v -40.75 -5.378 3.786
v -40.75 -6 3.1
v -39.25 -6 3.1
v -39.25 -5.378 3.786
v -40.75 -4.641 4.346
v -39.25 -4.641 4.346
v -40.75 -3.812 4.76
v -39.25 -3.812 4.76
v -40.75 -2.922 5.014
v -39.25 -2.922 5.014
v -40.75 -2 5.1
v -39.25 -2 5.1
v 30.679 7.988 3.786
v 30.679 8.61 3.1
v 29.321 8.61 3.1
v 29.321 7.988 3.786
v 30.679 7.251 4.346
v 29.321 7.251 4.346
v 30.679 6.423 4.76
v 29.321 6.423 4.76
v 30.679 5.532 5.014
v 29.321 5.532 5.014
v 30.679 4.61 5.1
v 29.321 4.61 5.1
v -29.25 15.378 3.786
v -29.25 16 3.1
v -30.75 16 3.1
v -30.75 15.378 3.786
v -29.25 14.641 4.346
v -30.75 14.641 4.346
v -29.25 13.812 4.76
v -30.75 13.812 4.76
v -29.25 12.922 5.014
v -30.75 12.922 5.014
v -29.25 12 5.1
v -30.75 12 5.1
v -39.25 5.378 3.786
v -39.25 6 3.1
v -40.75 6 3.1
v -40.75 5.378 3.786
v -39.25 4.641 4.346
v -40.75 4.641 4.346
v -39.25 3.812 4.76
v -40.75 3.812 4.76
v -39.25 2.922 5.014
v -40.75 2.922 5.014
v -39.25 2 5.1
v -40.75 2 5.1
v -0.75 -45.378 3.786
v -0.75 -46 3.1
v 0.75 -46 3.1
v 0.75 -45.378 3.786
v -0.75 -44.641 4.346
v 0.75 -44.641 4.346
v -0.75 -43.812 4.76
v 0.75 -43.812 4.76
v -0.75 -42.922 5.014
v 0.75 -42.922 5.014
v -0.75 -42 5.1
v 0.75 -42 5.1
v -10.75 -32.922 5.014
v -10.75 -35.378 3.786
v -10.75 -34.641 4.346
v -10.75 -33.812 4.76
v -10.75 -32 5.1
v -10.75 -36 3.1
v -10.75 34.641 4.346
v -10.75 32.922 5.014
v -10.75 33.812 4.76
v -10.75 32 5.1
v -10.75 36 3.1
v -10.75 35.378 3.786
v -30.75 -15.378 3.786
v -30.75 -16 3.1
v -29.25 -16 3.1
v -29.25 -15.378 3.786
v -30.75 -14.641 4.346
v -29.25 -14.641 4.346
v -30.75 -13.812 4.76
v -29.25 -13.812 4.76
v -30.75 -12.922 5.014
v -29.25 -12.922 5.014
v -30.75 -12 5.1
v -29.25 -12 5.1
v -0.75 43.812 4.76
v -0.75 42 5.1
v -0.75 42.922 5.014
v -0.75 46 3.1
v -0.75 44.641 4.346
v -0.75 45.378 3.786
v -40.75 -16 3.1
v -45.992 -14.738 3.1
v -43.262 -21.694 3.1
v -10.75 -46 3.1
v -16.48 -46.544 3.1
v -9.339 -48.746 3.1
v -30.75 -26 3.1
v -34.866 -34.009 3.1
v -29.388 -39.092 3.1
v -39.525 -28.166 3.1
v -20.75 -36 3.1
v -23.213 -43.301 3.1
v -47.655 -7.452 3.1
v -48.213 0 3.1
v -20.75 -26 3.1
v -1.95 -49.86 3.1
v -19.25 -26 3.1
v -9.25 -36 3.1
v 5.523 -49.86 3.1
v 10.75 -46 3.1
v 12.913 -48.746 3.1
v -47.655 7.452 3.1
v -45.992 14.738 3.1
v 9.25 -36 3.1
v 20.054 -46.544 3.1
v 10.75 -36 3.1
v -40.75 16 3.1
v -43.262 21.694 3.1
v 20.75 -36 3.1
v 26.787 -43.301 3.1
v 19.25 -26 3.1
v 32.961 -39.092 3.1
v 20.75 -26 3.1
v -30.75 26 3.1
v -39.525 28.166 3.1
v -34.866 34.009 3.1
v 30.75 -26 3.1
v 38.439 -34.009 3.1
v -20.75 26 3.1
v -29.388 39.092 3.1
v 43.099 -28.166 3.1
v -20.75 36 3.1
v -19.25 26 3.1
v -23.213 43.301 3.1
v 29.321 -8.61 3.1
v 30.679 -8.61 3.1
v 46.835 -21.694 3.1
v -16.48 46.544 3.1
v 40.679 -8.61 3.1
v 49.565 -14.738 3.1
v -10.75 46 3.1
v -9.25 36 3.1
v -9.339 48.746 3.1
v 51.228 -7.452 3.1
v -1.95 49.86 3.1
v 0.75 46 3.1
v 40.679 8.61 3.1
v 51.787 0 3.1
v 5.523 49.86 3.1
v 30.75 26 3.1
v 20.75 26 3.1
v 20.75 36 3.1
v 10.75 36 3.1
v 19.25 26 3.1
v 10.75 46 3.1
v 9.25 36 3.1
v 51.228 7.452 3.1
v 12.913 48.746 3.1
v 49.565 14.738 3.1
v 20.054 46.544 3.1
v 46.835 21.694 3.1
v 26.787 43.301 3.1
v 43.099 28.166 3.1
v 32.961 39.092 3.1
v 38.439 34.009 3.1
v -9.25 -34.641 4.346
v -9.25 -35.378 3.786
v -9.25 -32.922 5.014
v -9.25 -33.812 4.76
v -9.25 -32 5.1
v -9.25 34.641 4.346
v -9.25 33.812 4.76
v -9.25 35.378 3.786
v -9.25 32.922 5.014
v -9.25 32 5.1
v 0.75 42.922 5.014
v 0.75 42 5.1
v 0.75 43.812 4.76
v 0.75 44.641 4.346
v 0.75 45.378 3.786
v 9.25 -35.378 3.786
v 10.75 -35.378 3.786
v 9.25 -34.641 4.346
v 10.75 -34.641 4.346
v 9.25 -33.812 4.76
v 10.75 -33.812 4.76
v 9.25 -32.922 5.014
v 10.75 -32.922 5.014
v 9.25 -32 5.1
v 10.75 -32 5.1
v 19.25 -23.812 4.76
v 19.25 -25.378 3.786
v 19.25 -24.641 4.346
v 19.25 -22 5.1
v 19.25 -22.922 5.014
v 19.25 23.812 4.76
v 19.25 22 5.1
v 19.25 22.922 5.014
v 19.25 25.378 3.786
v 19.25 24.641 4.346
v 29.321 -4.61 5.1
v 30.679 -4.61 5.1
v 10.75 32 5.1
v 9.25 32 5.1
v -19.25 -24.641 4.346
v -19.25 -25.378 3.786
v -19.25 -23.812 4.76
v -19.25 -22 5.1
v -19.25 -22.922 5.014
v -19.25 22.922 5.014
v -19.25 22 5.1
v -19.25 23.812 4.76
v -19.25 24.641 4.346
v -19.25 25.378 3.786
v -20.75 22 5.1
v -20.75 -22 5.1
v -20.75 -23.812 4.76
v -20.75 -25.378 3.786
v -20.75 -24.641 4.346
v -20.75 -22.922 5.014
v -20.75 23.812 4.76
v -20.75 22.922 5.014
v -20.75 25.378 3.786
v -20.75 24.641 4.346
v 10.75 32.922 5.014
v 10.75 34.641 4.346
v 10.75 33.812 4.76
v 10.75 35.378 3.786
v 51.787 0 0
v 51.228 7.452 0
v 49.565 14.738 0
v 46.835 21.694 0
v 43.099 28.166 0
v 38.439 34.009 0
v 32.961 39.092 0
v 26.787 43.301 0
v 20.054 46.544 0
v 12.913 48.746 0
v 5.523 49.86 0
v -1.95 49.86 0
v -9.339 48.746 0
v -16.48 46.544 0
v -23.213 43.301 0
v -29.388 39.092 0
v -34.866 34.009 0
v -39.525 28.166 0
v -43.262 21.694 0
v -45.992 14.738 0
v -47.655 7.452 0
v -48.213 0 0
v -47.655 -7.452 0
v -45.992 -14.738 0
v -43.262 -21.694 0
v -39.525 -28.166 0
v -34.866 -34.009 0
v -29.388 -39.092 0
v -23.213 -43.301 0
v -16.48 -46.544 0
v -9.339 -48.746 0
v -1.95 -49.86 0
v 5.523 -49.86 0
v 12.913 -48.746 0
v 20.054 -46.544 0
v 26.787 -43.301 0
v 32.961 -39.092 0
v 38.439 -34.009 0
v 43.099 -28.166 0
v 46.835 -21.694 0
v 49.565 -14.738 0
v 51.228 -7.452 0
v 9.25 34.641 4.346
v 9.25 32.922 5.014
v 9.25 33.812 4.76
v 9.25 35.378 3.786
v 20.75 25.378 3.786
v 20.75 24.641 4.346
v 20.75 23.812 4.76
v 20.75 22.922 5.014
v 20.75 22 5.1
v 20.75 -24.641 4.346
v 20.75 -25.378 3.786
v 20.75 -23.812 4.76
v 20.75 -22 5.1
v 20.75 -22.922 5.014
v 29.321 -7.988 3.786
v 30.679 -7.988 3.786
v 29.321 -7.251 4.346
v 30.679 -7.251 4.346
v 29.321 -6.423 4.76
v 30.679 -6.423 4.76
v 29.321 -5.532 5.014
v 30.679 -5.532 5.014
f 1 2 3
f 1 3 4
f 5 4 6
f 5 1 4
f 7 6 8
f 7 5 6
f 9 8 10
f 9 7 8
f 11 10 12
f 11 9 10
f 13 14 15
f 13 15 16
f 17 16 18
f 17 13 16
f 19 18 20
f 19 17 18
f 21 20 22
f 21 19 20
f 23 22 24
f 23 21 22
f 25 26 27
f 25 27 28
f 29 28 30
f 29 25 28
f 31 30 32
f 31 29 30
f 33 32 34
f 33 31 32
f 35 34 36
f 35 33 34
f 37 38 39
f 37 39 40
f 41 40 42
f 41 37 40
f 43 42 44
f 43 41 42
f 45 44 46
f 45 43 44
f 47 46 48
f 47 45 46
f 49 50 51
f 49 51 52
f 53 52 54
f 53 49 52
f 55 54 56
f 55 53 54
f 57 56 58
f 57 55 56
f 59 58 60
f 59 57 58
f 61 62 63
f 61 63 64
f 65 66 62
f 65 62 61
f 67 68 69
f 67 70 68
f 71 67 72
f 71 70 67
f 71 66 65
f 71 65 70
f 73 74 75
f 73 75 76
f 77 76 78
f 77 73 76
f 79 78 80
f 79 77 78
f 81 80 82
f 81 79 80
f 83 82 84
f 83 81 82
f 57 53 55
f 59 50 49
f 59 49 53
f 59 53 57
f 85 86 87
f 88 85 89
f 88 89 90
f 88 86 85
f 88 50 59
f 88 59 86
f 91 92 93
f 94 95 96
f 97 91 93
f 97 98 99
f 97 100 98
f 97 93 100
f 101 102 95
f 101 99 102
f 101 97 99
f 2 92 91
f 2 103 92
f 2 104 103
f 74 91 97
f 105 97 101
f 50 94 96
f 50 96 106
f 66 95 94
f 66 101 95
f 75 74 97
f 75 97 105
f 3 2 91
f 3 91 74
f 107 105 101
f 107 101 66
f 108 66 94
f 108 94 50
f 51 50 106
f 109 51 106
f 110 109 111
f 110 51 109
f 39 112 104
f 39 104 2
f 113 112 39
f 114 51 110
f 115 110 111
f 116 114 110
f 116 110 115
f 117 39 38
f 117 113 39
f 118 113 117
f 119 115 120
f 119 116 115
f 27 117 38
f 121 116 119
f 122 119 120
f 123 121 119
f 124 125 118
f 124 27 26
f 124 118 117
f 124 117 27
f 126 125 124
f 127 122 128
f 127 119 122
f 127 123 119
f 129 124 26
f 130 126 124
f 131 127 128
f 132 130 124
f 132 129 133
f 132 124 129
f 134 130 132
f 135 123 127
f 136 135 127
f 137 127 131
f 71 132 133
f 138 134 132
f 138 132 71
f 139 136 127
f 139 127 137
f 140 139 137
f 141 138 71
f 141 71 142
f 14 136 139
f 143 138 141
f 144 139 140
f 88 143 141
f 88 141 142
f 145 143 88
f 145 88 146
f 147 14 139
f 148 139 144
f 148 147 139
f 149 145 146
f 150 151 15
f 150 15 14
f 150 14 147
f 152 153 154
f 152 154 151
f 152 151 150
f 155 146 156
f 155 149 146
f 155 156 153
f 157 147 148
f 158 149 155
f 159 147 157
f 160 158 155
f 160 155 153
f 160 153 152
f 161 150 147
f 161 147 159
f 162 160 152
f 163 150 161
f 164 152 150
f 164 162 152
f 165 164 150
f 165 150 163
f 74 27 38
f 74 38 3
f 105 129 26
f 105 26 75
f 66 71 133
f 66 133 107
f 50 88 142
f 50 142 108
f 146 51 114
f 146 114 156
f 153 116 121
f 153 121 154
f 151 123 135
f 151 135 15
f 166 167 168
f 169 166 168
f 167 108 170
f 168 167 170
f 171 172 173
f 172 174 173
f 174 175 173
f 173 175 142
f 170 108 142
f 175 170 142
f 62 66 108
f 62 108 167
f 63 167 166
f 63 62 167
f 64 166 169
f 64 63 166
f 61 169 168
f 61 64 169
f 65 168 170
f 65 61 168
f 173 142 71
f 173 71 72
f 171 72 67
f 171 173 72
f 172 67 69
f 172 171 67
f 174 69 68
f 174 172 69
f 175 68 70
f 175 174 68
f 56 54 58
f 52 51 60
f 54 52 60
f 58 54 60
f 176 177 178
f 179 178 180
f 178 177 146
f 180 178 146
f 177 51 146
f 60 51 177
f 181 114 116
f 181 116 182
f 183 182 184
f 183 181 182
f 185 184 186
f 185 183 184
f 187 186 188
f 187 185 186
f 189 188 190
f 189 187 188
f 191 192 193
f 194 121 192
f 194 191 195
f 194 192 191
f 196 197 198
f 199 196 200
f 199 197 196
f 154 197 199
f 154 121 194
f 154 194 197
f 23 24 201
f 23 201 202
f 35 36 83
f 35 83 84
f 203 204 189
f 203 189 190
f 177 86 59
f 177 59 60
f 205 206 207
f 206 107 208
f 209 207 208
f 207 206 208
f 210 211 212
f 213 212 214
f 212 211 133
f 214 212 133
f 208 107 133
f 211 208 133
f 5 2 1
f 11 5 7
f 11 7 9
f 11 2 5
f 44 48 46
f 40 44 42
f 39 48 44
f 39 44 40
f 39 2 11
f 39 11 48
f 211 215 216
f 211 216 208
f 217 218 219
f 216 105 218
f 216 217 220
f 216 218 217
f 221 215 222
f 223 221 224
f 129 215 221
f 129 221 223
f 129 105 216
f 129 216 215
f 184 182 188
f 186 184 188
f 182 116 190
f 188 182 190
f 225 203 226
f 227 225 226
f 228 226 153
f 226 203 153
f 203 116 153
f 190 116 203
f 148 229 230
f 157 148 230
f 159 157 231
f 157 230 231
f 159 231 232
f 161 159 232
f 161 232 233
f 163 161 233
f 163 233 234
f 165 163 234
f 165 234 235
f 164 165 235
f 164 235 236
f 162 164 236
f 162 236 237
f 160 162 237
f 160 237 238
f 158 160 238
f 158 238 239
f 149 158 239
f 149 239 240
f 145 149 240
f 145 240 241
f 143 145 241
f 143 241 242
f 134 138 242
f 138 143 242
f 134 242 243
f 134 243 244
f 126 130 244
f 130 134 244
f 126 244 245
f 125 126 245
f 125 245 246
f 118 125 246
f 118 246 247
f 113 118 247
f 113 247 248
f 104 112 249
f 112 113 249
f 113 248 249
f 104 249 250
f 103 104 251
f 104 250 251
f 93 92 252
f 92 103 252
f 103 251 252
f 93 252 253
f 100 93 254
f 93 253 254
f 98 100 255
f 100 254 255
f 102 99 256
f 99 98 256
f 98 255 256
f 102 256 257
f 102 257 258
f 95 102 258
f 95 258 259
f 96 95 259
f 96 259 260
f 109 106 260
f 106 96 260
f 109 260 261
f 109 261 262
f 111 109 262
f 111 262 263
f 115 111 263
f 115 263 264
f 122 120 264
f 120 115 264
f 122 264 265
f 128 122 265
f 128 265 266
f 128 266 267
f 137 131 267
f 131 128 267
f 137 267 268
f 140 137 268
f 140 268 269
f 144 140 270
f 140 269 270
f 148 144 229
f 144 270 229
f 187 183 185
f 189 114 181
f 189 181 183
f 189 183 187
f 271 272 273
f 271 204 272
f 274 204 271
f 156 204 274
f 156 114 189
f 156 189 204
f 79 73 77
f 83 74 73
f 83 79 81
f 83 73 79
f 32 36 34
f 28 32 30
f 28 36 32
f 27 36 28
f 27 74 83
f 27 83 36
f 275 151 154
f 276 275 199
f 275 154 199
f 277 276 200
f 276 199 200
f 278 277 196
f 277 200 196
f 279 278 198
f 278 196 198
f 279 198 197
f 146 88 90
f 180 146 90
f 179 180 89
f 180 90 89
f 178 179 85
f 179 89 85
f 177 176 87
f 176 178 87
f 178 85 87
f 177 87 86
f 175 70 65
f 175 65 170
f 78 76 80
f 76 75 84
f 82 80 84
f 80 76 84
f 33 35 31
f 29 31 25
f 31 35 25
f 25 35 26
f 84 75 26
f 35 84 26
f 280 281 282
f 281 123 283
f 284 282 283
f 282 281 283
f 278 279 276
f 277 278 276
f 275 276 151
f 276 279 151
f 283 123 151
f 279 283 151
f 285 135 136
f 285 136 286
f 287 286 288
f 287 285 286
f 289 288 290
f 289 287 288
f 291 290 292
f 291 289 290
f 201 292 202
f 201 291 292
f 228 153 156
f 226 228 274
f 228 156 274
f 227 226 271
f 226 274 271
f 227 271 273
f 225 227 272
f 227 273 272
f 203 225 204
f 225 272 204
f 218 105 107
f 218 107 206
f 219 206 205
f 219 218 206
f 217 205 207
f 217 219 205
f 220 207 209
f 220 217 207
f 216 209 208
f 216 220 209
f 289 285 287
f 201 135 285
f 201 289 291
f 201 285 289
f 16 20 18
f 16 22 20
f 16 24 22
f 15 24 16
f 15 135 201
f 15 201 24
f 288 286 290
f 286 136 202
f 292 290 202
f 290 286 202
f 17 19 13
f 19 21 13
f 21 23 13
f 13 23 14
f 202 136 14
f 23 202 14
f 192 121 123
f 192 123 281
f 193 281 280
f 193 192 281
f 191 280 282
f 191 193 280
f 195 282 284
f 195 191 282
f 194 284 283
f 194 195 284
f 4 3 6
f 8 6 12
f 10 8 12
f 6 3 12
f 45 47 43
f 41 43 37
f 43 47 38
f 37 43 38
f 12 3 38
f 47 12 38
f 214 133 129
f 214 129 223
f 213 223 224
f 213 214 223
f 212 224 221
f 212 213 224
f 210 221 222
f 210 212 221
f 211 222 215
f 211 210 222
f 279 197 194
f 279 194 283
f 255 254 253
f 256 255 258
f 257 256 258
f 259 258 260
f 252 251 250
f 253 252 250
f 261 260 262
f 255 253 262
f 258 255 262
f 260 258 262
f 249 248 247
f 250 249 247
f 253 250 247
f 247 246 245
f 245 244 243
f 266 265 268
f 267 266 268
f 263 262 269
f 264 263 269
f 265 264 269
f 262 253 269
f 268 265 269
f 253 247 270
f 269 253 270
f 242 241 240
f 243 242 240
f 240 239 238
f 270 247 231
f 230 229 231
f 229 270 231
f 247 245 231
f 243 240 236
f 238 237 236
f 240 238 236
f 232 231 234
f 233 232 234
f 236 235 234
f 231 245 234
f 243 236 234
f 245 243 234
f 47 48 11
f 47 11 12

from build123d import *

# Parameters (mm, degrees)
F0_R         = 50
F1_DEPTH     = 3.1
F2_W         = 1.5
F2_H         = 92
F2_H_2       = 72
F2_H_3       = 52
F2_H_4       = 32
F2_H_5       = 12
F2_W_2       = 1.3582831621
F2_H_6       = 17.2204319388
F3_DEPTH     = 2
F4_T1_DEPTH  = 11.5
F4_T3_DEPTH  = 11.5
F4_T5_DEPTH  = 21.5
F4_T10_DEPTH = 21.5
F4_T15_DEPTH = 21.5
F4_T20_DEPTH = 21.5
F4_T25_DEPTH = 21.5
F4_T30_DEPTH = 21.5
F4_T35_DEPTH = 21.5
F4_T40_DEPTH = 21.5
F4_T45_DEPTH = 21.5
F4_T50_DEPTH = 21.3582831621
F4_T55_DEPTH = 21.3582831621


# Not quite as in the source:
# - a fillet or chamfer that OpenCascade refuses, or shapes differently, is made with other operations: its cross-section is extruded or revolved along the edge and cut away or added


with BuildPart() as f1:
    # F0 (on Top) → F1 (new body)
    with BuildSketch(Plane.XY):
        with Locations((1.7865982372, 0)):
            Circle(F0_R)
    extrude(amount=F1_DEPTH)

    # F2 (on face) → F3 (join)
    with BuildSketch(Plane.XY.offset(3.1)):
        Rectangle(F2_W, F2_H)
        with Locations((-10, 0)):
            Rectangle(F2_W, F2_H_2)
        with Locations((-20, 0)):
            Rectangle(F2_W, F2_H_3)
        with Locations((-30, 0)):
            Rectangle(F2_W, F2_H_4)
        with Locations((-40, 0)):
            Rectangle(F2_W, F2_H_5)
        with Locations((10, 0)):
            Rectangle(F2_W, F2_H_2)
        with Locations((20, 0)):
            Rectangle(F2_W, F2_H_3)
        with Locations((30, 0)):
            Rectangle(F2_W_2, F2_H_6)
    extrude(amount=F3_DEPTH)

    # F4: fillet of radius 5 on 16 edges, made by hand

    # F4_s2 → F4_t1 (cut)
    with BuildSketch(Plane.YZ.offset(9.25)):
        with BuildLine():
            ThreePointArc((-36, 3.1), (-34.2360679775, 4.572135955), (-32, 5.1))
            Line((-32, 5.1), (-36, 5.1))
            Line((-36, 5.1), (-36, 3.1))
        make_face()
        with BuildLine():
            ThreePointArc((36, 3.1), (34.2360679775, 4.572135955), (32, 5.1))
            Line((32, 5.1), (36, 5.1))
            Line((36, 5.1), (36, 3.1))
        make_face()
    extrude(amount=F4_T1_DEPTH, mode=Mode.SUBTRACT)

    # F4_s4 → F4_t3 (cut)
    with BuildSketch(Plane.YZ.offset(19.25)):
        with BuildLine():
            ThreePointArc((26, 3.1), (24.2360679775, 4.572135955), (22, 5.1))
            Line((22, 5.1), (26, 5.1))
            Line((26, 5.1), (26, 3.1))
        make_face()
        with BuildLine():
            ThreePointArc((-26, 3.1), (-24.2360679775, 4.572135955), (-22, 5.1))
            Line((-22, 5.1), (-26, 5.1))
            Line((-26, 5.1), (-26, 3.1))
        make_face()
    extrude(amount=F4_T3_DEPTH, mode=Mode.SUBTRACT)

    # F4_s6 → F4_t5 (cut)
    with BuildSketch(Plane.YZ.offset(-10.75)):
        with BuildLine():
            ThreePointArc((46, 3.1), (44.2360679775, 4.572135955), (42, 5.1))
            Line((42, 5.1), (46, 5.1))
            Line((46, 5.1), (46, 3.1))
        make_face()
        with BuildLine():
            ThreePointArc((-46, 3.1), (-44.2360679775, 4.572135955), (-42, 5.1))
            Line((-42, 5.1), (-46, 5.1))
            Line((-46, 5.1), (-46, 3.1))
        make_face()
    extrude(amount=F4_T5_DEPTH, mode=Mode.SUBTRACT)


with BuildPart() as f4_tool8:
    # F4_s9 → F4_t10 (new body)
    with BuildSketch(Plane.YZ.offset(0.75)):
        with BuildLine():
            ThreePointArc((36, 3.1), (34.2360679775, 4.572135955), (32, 5.1))
            Line((32, 5.1), (36, 5.1))
            Line((36, 5.1), (36, 3.1))
        make_face()
    extrude(amount=-F4_T10_DEPTH)

    split(bisect_by=Plane.YZ.offset(-0.75), keep=Keep.BOTTOM)


with BuildPart() as f1_1:
    add(f1.part)

    # F4_t7: cut F4_tool8
    add(f4_tool8.part, mode=Mode.SUBTRACT)


with BuildPart() as f4_tool13:
    # F4_s14 → F4_t15 (new body)
    with BuildSketch(Plane.YZ.offset(-9.25)):
        with BuildLine():
            ThreePointArc((26, 3.1), (24.2360679775, 4.572135955), (22, 5.1))
            Line((22, 5.1), (26, 5.1))
            Line((26, 5.1), (26, 3.1))
        make_face()
    extrude(amount=-F4_T15_DEPTH)

    split(bisect_by=Plane.YZ.offset(-10.75), keep=Keep.BOTTOM)


with BuildPart() as f1_2:
    add(f1_1.part)

    # F4_t12: cut F4_tool13
    add(f4_tool13.part, mode=Mode.SUBTRACT)


with BuildPart() as f4_tool18:
    # F4_s19 → F4_t20 (new body)
    with BuildSketch(Plane.YZ.offset(-19.25)):
        with BuildLine():
            ThreePointArc((16, 3.1), (14.2360679775, 4.572135955), (12, 5.1))
            Line((12, 5.1), (16, 5.1))
            Line((16, 5.1), (16, 3.1))
        make_face()
    extrude(amount=-F4_T20_DEPTH)

    split(bisect_by=Plane.YZ.offset(-20.75), keep=Keep.BOTTOM)


with BuildPart() as f1_3:
    add(f1_2.part)

    # F4_t17: cut F4_tool18
    add(f4_tool18.part, mode=Mode.SUBTRACT)


with BuildPart() as f4_tool23:
    # F4_s24 → F4_t25 (new body)
    with BuildSketch(Plane.YZ.offset(-29.25)):
        with BuildLine():
            ThreePointArc((6, 3.1), (4.2360679775, 4.572135955), (2, 5.1))
            Line((2, 5.1), (6, 5.1))
            Line((6, 5.1), (6, 3.1))
        make_face()
    extrude(amount=-F4_T25_DEPTH)

    split(bisect_by=Plane.YZ.offset(-30.75), keep=Keep.BOTTOM)


with BuildPart() as f1_4:
    add(f1_3.part)

    # F4_t22: cut F4_tool23
    add(f4_tool23.part, mode=Mode.SUBTRACT)


with BuildPart() as f4_tool28:
    # F4_s29 → F4_t30 (new body)
    with BuildSketch(Plane.YZ.offset(-50.75)):
        with BuildLine():
            ThreePointArc((-6, 3.1), (-4.2360679775, 4.572135955), (-2, 5.1))
            Line((-2, 5.1), (-6, 5.1))
            Line((-6, 5.1), (-6, 3.1))
        make_face()
    extrude(amount=F4_T30_DEPTH)

    split(bisect_by=Plane.YZ.offset(-30.75), keep=Keep.BOTTOM)


with BuildPart() as f1_5:
    add(f1_4.part)

    # F4_t27: cut F4_tool28
    add(f4_tool28.part, mode=Mode.SUBTRACT)


with BuildPart() as f4_tool33:
    # F4_s34 → F4_t35 (new body)
    with BuildSketch(Plane.YZ.offset(-40.75)):
        with BuildLine():
            ThreePointArc((-16, 3.1), (-14.2360679775, 4.572135955), (-12, 5.1))
            Line((-12, 5.1), (-16, 5.1))
            Line((-16, 5.1), (-16, 3.1))
        make_face()
    extrude(amount=F4_T35_DEPTH)

    split(bisect_by=Plane.YZ.offset(-20.75), keep=Keep.BOTTOM)


with BuildPart() as f1_6:
    add(f1_5.part)

    # F4_t32: cut F4_tool33
    add(f4_tool33.part, mode=Mode.SUBTRACT)


with BuildPart() as f4_tool38:
    # F4_s39 → F4_t40 (new body)
    with BuildSketch(Plane.YZ.offset(-30.75)):
        with BuildLine():
            ThreePointArc((-26, 3.1), (-24.2360679775, 4.572135955), (-22, 5.1))
            Line((-22, 5.1), (-26, 5.1))
            Line((-26, 5.1), (-26, 3.1))
        make_face()
    extrude(amount=F4_T40_DEPTH)

    split(bisect_by=Plane.YZ.offset(-10.75), keep=Keep.BOTTOM)


with BuildPart() as f1_7:
    add(f1_6.part)

    # F4_t37: cut F4_tool38
    add(f4_tool38.part, mode=Mode.SUBTRACT)


with BuildPart() as f4_tool43:
    # F4_s44 → F4_t45 (new body)
    with BuildSketch(Plane.YZ.offset(-20.75)):
        with BuildLine():
            ThreePointArc((-36, 3.1), (-34.2360679775, 4.572135955), (-32, 5.1))
            Line((-32, 5.1), (-36, 5.1))
            Line((-36, 5.1), (-36, 3.1))
        make_face()
    extrude(amount=F4_T45_DEPTH)

    split(bisect_by=Plane.YZ.offset(-0.75), keep=Keep.BOTTOM)


with BuildPart() as f1_8:
    add(f1_7.part)

    # F4_t42: cut F4_tool43
    add(f4_tool43.part, mode=Mode.SUBTRACT)


with BuildPart() as f4_tool48:
    # F4_s49 → F4_t50 (new body)
    with BuildSketch(Plane.YZ.offset(19.3208584189)):
        with BuildLine():
            ThreePointArc((-8.6102159694, 3.1), (-6.8462839469, 4.572135955), (-4.6102159694, 5.1))
            Line((-4.6102159694, 5.1), (-8.6102159694, 5.1))
            Line((-8.6102159694, 5.1), (-8.6102159694, 3.1))
        make_face()
    extrude(amount=F4_T50_DEPTH)

    split(bisect_by=Plane.YZ.offset(20.75), keep=Keep.TOP)


with BuildPart() as f1_9:
    add(f1_8.part)

    # F4_t47: cut F4_tool48
    add(f4_tool48.part, mode=Mode.SUBTRACT)


with BuildPart() as f4_tool53:
    # F4_s54 → F4_t55 (new body)
    with BuildSketch(Plane.YZ.offset(40.6791415811)):
        with BuildLine():
            ThreePointArc((8.6102159694, 3.1), (6.8462839469, 4.572135955), (4.6102159694, 5.1))
            Line((4.6102159694, 5.1), (8.6102159694, 5.1))
            Line((8.6102159694, 5.1), (8.6102159694, 3.1))
        make_face()
    extrude(amount=-F4_T55_DEPTH)

    split(bisect_by=Plane.YZ.offset(20.75), keep=Keep.TOP)


with BuildPart() as f1_10:
    add(f1_9.part)

    # F4_t52: cut F4_tool53
    add(f4_tool53.part, mode=Mode.SUBTRACT)


solid = f1_10.part
